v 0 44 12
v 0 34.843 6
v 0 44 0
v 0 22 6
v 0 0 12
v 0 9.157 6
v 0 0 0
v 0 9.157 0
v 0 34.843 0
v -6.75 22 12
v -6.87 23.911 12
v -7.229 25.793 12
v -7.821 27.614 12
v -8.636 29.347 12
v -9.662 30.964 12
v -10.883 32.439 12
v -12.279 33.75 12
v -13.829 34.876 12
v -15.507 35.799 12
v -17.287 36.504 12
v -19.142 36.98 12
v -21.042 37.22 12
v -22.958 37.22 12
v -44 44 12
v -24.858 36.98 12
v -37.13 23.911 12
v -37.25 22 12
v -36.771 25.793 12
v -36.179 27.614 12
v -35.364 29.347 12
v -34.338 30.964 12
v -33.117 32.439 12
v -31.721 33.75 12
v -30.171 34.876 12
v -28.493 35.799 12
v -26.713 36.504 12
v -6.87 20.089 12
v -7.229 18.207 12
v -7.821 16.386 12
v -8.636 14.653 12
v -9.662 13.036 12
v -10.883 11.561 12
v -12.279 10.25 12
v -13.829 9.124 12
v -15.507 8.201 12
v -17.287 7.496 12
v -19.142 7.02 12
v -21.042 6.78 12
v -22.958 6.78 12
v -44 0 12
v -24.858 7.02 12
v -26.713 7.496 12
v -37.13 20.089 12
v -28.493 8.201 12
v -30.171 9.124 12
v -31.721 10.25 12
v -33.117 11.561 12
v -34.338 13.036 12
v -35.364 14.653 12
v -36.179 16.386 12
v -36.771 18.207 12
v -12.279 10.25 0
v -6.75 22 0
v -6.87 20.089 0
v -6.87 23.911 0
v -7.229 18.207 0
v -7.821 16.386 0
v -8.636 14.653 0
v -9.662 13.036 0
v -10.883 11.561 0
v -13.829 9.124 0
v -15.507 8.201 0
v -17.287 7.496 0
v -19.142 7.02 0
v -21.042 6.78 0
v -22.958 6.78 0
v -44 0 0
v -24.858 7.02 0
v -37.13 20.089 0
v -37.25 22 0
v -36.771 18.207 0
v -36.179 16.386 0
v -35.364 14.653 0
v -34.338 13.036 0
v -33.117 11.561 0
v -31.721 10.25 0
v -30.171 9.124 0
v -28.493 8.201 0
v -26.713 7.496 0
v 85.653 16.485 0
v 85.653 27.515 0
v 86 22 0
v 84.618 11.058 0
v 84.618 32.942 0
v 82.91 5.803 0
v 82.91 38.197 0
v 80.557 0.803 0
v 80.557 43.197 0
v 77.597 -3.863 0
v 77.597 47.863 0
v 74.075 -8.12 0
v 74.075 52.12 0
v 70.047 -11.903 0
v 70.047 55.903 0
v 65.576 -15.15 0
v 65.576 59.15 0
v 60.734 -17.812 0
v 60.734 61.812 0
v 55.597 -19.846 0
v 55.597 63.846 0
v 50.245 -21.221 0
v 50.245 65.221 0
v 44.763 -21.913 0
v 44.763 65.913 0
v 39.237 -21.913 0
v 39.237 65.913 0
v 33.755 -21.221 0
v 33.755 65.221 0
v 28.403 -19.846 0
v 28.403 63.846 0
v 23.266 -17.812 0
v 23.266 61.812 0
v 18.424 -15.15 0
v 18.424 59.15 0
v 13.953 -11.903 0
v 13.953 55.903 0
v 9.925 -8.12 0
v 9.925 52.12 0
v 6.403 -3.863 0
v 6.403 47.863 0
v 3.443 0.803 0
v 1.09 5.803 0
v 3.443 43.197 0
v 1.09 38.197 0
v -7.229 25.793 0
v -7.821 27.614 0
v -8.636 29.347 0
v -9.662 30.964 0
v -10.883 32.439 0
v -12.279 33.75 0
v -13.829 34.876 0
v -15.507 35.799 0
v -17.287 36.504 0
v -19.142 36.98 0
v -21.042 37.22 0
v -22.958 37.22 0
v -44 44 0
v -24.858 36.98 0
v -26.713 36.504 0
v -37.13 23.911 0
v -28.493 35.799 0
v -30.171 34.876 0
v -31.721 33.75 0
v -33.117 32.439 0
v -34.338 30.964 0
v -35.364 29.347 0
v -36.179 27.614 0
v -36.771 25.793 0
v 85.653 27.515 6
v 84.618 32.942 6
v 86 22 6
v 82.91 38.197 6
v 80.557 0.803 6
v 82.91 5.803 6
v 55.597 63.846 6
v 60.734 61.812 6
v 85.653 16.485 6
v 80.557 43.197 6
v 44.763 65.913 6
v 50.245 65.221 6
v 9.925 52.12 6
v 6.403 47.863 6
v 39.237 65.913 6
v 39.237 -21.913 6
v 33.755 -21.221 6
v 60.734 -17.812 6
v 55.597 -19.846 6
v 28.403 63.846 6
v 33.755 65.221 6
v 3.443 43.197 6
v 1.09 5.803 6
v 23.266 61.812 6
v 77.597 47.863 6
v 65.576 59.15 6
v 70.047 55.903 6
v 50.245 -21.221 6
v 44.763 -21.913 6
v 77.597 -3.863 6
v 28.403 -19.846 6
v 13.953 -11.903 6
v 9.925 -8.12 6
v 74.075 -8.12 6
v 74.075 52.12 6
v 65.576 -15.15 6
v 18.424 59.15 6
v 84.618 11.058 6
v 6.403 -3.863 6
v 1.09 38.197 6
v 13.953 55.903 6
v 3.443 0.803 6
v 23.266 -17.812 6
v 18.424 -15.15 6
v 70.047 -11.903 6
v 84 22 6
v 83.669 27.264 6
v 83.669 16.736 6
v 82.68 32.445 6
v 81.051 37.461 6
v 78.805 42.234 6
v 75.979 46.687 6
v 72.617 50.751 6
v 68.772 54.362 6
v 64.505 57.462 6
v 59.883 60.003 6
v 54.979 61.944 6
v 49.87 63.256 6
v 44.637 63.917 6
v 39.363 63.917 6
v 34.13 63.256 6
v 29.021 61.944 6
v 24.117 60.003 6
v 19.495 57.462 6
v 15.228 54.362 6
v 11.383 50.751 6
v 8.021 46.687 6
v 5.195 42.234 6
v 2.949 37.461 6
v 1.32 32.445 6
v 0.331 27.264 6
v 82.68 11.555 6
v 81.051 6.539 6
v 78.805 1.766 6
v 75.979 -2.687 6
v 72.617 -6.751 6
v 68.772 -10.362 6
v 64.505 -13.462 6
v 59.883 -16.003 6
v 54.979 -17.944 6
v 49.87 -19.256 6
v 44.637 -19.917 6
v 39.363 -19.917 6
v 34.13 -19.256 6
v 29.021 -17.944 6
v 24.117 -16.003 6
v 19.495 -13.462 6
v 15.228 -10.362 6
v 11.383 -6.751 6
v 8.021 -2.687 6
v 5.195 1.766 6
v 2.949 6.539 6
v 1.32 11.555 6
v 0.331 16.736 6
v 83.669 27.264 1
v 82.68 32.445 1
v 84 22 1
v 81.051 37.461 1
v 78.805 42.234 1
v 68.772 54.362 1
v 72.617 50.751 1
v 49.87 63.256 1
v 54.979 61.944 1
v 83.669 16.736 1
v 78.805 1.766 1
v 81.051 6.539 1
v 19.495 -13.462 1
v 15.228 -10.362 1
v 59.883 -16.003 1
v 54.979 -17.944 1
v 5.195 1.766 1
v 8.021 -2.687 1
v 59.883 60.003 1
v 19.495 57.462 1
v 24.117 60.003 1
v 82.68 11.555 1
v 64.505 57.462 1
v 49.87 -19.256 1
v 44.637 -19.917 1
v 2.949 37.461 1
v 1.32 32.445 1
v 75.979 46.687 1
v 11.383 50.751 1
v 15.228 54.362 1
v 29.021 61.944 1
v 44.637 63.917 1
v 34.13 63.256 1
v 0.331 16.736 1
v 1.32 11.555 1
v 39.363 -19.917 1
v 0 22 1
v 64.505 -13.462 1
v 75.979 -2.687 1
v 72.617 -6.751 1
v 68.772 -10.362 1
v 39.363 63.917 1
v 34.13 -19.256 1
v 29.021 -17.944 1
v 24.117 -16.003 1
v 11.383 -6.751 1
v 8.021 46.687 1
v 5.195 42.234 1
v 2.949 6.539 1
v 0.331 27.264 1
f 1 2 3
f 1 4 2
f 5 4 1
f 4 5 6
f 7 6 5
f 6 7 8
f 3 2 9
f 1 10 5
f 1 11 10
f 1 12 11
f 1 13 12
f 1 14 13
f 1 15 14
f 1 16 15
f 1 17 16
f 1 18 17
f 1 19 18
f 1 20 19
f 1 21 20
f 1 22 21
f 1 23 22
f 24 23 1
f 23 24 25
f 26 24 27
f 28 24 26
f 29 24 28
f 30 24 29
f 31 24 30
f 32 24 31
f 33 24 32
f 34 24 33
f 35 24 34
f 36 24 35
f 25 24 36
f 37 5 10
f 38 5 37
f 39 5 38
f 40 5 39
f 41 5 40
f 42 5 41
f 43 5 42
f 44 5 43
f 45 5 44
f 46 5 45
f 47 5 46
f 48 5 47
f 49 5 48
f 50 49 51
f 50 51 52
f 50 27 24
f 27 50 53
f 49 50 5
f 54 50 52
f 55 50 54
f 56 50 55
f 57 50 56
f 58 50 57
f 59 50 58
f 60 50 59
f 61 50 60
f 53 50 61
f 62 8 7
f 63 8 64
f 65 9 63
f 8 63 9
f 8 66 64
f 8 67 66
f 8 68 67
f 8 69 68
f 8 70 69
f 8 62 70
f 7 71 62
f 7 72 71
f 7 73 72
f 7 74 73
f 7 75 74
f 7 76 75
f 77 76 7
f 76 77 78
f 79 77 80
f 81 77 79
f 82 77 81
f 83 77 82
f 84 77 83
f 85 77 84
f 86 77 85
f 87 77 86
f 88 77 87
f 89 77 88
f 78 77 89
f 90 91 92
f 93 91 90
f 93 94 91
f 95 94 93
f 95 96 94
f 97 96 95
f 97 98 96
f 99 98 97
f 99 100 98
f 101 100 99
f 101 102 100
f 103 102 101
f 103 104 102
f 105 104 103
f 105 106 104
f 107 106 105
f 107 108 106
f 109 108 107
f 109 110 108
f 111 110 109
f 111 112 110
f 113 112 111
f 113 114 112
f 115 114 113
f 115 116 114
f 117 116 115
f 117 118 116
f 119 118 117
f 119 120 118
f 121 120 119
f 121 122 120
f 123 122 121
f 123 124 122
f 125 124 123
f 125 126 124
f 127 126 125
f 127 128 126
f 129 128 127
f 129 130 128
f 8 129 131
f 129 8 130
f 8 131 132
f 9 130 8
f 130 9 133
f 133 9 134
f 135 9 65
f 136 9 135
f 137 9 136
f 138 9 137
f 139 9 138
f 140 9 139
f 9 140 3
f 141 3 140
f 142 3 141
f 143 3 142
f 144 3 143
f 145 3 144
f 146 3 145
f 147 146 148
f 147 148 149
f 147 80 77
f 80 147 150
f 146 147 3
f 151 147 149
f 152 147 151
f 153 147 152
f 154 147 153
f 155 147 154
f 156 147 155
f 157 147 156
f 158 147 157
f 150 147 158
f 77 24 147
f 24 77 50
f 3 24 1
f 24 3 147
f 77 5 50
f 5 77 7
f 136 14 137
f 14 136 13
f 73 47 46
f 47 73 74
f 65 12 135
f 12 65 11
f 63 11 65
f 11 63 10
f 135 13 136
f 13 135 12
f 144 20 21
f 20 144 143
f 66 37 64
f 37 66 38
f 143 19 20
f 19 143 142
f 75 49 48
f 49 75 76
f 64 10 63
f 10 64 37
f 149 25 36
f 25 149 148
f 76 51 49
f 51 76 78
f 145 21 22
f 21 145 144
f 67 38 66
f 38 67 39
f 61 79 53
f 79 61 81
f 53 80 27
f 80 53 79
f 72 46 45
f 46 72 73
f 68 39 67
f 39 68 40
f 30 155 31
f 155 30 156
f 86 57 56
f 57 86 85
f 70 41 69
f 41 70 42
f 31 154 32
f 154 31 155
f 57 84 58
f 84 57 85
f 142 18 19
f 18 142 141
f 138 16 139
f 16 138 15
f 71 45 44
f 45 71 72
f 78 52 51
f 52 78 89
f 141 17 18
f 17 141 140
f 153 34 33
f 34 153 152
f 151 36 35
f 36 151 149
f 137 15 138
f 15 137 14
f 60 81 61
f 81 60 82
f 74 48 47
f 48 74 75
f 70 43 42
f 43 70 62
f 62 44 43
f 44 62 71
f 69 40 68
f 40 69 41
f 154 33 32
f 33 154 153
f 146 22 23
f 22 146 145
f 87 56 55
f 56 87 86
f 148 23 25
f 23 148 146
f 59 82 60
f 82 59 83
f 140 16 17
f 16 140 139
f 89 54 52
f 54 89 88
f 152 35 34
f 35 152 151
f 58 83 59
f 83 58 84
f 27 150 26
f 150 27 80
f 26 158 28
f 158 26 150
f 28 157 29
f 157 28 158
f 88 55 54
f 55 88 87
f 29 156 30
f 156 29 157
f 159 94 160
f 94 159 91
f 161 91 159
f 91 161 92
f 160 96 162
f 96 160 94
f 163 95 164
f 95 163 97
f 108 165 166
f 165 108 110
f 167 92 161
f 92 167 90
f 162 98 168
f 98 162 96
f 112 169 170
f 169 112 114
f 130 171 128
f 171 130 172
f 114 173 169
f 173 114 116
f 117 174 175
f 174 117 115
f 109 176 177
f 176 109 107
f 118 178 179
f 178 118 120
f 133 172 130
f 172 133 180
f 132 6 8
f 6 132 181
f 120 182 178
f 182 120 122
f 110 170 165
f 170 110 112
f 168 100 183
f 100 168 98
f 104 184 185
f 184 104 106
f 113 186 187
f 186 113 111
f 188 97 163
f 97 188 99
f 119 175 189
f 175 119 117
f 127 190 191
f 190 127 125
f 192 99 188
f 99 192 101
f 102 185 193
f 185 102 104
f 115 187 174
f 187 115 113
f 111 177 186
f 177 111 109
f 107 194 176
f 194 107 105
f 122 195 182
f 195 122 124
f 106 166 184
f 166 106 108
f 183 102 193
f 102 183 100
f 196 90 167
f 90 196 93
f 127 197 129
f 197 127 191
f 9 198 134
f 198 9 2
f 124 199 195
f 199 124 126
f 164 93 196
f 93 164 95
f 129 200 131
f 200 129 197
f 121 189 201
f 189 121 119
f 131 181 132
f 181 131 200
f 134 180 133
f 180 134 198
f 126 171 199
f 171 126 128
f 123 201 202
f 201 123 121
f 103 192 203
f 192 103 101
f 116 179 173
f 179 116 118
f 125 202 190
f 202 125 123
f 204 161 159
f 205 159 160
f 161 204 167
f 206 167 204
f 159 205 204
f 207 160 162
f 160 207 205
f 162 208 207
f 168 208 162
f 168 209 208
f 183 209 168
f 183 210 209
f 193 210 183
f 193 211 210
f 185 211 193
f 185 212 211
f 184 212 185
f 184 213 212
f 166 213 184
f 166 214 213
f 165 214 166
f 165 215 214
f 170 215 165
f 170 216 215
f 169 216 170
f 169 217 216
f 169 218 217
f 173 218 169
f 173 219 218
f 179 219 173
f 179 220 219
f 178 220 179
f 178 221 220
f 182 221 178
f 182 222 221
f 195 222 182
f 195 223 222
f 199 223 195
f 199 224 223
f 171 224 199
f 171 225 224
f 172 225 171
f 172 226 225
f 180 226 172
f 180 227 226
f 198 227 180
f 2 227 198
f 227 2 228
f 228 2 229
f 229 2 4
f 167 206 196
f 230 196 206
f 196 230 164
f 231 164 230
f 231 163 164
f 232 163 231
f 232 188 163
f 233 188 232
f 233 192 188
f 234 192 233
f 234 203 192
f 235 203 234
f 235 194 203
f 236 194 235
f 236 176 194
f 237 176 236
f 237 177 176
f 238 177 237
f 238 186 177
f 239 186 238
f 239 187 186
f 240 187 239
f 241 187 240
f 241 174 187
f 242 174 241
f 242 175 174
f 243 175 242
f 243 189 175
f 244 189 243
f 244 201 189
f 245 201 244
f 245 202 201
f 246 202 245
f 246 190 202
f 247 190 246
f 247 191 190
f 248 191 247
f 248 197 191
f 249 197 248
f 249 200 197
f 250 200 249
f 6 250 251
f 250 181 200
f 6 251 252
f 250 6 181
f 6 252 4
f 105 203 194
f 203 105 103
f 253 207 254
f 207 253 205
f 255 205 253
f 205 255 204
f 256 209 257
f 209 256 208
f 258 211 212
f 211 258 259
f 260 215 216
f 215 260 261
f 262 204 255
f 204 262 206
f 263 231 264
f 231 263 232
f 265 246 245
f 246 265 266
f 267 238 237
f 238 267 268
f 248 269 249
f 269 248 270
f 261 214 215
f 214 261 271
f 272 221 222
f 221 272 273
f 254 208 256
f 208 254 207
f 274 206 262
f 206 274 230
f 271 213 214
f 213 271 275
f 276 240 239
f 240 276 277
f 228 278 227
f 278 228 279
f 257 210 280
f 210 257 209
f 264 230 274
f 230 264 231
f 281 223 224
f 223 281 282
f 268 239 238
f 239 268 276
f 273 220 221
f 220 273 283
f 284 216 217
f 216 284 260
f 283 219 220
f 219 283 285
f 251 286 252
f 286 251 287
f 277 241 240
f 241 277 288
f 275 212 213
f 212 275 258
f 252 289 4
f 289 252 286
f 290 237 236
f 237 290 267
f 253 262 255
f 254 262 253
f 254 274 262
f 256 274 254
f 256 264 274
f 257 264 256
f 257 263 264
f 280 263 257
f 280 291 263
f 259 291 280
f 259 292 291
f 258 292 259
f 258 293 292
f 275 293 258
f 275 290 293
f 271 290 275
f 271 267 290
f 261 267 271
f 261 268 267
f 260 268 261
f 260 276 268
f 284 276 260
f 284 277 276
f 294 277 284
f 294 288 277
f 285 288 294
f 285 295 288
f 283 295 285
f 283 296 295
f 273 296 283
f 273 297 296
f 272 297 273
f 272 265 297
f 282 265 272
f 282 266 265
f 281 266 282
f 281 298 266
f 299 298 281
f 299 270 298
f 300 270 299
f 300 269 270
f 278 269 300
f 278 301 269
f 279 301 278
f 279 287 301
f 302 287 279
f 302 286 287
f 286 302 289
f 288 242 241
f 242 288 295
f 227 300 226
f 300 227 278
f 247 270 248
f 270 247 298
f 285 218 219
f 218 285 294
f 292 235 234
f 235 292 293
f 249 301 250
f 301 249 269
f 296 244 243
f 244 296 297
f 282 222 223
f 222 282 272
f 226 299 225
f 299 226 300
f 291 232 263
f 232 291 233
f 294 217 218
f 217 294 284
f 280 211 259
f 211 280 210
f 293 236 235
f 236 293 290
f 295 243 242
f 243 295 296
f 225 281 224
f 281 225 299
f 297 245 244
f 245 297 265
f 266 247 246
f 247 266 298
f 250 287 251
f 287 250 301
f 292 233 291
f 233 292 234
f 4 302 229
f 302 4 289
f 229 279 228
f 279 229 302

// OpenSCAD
a=44;
b=12;
c=30.5;
d=20;
w=2;
$fn=50;

/*
hull()
intersection() {
translate([-a/4,-a/2,0])
cube([a/2,a,b]);
foo(a,b,a,0.0001,-1);
}
*/
foo(a,b,c,w,w/2);

module foo(a,b,c,w,d) {
translate([-a,0,0])
difference() {
cube([a,a,b]);
    translate([a/2,a/2,-1])
    cylinder(h=b+2,d=c);
}
translate([-w,0,0])
translate([a,a/2,0])
difference() {
cylinder(h=b/2,d=2*a);
    translate([0,0,d]) 
    cylinder(h=b,d=2*a-2*w);
}
}
/*
difference() {
cube([a/2,a,b]);
  translate([a/4,a/2,-1])
    cylinder(h=b+2,d=a/3);
translate([6*a/18,0,-1])
cube([a/8+1,a,b+2]);
}
hull() {
  translate([a/2-a/12,5*a/16,0])
    cylinder(h=b,d=a/6);
translate([3*a/8,0,0])
cube([a/8,a/8,b]);
}*/
